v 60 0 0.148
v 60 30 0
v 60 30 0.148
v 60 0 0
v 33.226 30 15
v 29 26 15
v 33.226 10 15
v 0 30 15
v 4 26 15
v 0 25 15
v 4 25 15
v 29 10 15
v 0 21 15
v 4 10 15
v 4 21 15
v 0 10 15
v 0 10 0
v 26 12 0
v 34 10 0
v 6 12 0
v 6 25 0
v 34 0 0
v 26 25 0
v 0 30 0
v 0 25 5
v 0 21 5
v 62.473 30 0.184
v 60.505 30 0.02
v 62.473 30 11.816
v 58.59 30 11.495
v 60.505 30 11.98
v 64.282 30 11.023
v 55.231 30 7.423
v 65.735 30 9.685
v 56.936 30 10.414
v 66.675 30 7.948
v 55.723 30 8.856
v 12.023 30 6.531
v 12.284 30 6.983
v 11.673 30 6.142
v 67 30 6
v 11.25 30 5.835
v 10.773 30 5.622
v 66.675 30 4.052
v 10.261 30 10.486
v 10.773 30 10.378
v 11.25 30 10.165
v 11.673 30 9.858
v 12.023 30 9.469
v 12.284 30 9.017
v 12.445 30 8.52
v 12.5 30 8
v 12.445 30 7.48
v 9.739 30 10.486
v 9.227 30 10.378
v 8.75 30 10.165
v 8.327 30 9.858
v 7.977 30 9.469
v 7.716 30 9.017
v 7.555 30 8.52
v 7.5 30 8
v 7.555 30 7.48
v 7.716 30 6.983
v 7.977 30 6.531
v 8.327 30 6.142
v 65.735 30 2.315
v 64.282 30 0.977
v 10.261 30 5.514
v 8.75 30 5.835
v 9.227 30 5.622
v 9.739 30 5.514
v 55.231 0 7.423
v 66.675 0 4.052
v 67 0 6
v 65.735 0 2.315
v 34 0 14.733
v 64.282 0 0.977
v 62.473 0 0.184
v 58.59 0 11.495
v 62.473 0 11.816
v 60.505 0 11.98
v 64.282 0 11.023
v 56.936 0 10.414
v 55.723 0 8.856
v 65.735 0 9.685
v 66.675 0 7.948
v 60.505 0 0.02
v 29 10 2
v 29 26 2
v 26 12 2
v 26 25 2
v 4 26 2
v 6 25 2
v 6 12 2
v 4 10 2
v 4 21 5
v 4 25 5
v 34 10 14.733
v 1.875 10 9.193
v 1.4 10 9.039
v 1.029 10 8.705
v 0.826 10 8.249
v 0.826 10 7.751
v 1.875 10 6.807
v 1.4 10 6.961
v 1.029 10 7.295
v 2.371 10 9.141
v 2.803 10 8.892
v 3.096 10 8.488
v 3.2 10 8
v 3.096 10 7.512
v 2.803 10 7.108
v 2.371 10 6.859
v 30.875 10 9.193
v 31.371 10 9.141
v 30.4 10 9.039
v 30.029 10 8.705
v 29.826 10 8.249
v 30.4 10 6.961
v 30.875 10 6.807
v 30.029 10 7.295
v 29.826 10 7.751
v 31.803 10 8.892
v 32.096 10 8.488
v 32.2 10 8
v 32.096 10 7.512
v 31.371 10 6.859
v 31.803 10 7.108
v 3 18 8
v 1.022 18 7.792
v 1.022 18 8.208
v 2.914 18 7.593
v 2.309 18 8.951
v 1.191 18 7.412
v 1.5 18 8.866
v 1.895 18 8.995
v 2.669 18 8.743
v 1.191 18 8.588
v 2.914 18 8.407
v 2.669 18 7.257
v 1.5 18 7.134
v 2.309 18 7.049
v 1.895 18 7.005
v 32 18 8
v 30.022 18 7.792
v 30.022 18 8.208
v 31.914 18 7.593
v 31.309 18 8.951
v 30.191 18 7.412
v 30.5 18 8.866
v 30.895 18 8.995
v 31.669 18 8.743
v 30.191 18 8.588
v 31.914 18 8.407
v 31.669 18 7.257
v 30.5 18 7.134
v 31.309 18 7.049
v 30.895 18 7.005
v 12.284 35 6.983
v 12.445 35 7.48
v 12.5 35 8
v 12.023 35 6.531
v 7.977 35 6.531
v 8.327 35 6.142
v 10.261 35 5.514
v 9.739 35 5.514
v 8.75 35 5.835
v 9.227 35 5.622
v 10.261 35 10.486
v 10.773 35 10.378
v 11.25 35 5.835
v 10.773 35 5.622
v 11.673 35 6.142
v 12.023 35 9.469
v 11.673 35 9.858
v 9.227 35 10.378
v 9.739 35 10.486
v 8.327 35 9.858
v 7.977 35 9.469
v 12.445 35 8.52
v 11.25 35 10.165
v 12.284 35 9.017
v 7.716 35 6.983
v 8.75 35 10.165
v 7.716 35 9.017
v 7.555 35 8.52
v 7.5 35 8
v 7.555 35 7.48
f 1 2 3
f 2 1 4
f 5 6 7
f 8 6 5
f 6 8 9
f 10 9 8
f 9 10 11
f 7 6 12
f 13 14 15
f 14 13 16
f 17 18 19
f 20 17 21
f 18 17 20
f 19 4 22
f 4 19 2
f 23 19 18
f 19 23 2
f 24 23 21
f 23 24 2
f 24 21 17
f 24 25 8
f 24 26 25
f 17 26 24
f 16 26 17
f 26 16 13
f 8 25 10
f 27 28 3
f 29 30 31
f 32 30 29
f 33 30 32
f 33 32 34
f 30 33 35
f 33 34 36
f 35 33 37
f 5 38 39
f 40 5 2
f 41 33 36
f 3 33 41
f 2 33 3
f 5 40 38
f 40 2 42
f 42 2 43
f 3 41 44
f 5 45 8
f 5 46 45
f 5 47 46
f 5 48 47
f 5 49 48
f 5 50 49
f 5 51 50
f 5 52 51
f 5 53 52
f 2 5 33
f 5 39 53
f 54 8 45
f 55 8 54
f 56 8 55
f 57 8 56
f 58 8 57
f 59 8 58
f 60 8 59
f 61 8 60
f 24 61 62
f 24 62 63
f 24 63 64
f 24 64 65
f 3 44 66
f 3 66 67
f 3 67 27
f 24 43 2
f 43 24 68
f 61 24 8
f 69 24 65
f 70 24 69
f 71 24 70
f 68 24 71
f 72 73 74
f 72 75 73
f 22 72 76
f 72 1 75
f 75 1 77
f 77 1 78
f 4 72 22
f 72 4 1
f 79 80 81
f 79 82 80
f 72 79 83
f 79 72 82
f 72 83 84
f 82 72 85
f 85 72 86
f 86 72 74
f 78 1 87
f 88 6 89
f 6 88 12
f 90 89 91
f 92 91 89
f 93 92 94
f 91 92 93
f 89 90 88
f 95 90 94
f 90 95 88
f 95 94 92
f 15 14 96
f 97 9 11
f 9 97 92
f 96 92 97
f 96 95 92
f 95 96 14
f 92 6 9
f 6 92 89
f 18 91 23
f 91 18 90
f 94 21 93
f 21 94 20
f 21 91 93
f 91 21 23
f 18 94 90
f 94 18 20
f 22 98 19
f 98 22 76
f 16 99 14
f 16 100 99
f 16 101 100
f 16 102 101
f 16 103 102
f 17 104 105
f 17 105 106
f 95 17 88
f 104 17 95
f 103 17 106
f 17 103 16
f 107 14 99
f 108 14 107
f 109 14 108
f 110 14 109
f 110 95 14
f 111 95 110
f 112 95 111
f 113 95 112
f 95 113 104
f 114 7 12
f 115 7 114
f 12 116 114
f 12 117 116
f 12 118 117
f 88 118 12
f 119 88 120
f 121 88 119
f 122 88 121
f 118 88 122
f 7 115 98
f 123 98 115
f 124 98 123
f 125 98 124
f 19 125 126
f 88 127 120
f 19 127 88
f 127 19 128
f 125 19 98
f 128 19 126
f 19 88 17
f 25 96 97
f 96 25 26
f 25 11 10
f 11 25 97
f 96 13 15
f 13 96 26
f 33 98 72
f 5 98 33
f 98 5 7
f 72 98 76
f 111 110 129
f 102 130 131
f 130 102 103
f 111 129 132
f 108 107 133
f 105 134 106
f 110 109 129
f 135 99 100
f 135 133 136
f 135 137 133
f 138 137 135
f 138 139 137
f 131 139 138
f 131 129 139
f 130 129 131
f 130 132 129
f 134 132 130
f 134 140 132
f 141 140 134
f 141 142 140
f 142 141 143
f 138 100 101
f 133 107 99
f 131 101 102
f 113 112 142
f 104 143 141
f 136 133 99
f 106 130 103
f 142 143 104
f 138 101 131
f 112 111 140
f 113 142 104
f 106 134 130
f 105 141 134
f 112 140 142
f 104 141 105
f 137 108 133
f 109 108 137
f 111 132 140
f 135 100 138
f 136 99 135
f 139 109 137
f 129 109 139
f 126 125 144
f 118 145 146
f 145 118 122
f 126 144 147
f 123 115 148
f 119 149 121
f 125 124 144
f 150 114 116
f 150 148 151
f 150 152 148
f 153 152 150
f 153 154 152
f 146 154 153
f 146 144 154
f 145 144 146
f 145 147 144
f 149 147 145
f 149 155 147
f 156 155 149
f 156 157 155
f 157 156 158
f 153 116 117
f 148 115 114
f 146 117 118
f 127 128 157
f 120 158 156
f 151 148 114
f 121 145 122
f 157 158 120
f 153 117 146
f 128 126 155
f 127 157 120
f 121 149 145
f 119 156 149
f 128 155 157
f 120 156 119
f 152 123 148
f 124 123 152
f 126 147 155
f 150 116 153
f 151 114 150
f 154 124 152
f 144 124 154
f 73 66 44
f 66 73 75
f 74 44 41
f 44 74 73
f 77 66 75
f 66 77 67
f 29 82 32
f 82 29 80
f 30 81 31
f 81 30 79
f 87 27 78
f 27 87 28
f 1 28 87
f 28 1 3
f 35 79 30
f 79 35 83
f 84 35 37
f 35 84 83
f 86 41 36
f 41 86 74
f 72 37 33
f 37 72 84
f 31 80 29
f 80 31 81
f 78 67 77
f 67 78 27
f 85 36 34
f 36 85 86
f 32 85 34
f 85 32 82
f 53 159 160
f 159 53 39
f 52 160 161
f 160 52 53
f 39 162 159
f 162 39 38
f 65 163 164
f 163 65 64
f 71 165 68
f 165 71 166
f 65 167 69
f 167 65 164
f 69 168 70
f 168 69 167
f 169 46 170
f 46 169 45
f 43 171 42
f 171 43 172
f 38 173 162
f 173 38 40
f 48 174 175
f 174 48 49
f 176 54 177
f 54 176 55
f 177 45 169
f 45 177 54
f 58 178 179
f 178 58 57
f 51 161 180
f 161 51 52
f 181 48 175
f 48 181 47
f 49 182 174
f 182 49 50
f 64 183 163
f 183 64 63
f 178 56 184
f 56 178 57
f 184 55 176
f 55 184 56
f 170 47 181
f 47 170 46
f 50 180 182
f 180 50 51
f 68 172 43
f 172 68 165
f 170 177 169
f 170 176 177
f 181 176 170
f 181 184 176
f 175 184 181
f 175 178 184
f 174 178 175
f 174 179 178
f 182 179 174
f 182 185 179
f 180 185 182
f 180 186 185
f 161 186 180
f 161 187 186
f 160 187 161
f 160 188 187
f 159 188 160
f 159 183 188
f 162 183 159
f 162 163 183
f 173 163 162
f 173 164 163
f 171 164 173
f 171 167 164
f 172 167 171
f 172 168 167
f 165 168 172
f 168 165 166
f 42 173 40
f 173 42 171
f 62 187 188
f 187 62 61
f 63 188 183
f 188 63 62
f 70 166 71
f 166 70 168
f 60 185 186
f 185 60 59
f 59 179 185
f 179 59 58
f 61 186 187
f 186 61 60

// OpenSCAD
// Vasen jalka (左)

difference(){
    // Jalka
    cube([60,30,15]);
    translate([4,-4,2]) cube([25,30,15]);
    translate([6,12,-2]) cube([20,13,15]);
    // Sensoripään syvennys
    translate([28,-1,2]) cube([6,11,15]);
    translate([-1,-1,-1]) cube([35,11,17]);
    // Johdon aukko
    translate([-1,21,5]) cube([6,4,11]);
    
    // Tassu
    rotate([0,19,0])translate([26.5,0,25])cube([25,30,10]);
    translate([55,0,8])cube([10,30,10]);
    
    // Ruuviaukot
    rotate([-90,0,0])translate([2,-8,10])cylinder(8,1.2,1,$fn=15);
    rotate([-90,0,0])translate([31,-8,10])cylinder(8,1.2,1,$fn=15);
    
}
// Tassu
rotate([-90,0,0])translate([61,-6,0])cylinder(30,6,6); 
// Kiinnityskohta
rotate([-90,0,0])translate([10,-8,29])cylinder(6,2.5,2.5,$fn=30);
